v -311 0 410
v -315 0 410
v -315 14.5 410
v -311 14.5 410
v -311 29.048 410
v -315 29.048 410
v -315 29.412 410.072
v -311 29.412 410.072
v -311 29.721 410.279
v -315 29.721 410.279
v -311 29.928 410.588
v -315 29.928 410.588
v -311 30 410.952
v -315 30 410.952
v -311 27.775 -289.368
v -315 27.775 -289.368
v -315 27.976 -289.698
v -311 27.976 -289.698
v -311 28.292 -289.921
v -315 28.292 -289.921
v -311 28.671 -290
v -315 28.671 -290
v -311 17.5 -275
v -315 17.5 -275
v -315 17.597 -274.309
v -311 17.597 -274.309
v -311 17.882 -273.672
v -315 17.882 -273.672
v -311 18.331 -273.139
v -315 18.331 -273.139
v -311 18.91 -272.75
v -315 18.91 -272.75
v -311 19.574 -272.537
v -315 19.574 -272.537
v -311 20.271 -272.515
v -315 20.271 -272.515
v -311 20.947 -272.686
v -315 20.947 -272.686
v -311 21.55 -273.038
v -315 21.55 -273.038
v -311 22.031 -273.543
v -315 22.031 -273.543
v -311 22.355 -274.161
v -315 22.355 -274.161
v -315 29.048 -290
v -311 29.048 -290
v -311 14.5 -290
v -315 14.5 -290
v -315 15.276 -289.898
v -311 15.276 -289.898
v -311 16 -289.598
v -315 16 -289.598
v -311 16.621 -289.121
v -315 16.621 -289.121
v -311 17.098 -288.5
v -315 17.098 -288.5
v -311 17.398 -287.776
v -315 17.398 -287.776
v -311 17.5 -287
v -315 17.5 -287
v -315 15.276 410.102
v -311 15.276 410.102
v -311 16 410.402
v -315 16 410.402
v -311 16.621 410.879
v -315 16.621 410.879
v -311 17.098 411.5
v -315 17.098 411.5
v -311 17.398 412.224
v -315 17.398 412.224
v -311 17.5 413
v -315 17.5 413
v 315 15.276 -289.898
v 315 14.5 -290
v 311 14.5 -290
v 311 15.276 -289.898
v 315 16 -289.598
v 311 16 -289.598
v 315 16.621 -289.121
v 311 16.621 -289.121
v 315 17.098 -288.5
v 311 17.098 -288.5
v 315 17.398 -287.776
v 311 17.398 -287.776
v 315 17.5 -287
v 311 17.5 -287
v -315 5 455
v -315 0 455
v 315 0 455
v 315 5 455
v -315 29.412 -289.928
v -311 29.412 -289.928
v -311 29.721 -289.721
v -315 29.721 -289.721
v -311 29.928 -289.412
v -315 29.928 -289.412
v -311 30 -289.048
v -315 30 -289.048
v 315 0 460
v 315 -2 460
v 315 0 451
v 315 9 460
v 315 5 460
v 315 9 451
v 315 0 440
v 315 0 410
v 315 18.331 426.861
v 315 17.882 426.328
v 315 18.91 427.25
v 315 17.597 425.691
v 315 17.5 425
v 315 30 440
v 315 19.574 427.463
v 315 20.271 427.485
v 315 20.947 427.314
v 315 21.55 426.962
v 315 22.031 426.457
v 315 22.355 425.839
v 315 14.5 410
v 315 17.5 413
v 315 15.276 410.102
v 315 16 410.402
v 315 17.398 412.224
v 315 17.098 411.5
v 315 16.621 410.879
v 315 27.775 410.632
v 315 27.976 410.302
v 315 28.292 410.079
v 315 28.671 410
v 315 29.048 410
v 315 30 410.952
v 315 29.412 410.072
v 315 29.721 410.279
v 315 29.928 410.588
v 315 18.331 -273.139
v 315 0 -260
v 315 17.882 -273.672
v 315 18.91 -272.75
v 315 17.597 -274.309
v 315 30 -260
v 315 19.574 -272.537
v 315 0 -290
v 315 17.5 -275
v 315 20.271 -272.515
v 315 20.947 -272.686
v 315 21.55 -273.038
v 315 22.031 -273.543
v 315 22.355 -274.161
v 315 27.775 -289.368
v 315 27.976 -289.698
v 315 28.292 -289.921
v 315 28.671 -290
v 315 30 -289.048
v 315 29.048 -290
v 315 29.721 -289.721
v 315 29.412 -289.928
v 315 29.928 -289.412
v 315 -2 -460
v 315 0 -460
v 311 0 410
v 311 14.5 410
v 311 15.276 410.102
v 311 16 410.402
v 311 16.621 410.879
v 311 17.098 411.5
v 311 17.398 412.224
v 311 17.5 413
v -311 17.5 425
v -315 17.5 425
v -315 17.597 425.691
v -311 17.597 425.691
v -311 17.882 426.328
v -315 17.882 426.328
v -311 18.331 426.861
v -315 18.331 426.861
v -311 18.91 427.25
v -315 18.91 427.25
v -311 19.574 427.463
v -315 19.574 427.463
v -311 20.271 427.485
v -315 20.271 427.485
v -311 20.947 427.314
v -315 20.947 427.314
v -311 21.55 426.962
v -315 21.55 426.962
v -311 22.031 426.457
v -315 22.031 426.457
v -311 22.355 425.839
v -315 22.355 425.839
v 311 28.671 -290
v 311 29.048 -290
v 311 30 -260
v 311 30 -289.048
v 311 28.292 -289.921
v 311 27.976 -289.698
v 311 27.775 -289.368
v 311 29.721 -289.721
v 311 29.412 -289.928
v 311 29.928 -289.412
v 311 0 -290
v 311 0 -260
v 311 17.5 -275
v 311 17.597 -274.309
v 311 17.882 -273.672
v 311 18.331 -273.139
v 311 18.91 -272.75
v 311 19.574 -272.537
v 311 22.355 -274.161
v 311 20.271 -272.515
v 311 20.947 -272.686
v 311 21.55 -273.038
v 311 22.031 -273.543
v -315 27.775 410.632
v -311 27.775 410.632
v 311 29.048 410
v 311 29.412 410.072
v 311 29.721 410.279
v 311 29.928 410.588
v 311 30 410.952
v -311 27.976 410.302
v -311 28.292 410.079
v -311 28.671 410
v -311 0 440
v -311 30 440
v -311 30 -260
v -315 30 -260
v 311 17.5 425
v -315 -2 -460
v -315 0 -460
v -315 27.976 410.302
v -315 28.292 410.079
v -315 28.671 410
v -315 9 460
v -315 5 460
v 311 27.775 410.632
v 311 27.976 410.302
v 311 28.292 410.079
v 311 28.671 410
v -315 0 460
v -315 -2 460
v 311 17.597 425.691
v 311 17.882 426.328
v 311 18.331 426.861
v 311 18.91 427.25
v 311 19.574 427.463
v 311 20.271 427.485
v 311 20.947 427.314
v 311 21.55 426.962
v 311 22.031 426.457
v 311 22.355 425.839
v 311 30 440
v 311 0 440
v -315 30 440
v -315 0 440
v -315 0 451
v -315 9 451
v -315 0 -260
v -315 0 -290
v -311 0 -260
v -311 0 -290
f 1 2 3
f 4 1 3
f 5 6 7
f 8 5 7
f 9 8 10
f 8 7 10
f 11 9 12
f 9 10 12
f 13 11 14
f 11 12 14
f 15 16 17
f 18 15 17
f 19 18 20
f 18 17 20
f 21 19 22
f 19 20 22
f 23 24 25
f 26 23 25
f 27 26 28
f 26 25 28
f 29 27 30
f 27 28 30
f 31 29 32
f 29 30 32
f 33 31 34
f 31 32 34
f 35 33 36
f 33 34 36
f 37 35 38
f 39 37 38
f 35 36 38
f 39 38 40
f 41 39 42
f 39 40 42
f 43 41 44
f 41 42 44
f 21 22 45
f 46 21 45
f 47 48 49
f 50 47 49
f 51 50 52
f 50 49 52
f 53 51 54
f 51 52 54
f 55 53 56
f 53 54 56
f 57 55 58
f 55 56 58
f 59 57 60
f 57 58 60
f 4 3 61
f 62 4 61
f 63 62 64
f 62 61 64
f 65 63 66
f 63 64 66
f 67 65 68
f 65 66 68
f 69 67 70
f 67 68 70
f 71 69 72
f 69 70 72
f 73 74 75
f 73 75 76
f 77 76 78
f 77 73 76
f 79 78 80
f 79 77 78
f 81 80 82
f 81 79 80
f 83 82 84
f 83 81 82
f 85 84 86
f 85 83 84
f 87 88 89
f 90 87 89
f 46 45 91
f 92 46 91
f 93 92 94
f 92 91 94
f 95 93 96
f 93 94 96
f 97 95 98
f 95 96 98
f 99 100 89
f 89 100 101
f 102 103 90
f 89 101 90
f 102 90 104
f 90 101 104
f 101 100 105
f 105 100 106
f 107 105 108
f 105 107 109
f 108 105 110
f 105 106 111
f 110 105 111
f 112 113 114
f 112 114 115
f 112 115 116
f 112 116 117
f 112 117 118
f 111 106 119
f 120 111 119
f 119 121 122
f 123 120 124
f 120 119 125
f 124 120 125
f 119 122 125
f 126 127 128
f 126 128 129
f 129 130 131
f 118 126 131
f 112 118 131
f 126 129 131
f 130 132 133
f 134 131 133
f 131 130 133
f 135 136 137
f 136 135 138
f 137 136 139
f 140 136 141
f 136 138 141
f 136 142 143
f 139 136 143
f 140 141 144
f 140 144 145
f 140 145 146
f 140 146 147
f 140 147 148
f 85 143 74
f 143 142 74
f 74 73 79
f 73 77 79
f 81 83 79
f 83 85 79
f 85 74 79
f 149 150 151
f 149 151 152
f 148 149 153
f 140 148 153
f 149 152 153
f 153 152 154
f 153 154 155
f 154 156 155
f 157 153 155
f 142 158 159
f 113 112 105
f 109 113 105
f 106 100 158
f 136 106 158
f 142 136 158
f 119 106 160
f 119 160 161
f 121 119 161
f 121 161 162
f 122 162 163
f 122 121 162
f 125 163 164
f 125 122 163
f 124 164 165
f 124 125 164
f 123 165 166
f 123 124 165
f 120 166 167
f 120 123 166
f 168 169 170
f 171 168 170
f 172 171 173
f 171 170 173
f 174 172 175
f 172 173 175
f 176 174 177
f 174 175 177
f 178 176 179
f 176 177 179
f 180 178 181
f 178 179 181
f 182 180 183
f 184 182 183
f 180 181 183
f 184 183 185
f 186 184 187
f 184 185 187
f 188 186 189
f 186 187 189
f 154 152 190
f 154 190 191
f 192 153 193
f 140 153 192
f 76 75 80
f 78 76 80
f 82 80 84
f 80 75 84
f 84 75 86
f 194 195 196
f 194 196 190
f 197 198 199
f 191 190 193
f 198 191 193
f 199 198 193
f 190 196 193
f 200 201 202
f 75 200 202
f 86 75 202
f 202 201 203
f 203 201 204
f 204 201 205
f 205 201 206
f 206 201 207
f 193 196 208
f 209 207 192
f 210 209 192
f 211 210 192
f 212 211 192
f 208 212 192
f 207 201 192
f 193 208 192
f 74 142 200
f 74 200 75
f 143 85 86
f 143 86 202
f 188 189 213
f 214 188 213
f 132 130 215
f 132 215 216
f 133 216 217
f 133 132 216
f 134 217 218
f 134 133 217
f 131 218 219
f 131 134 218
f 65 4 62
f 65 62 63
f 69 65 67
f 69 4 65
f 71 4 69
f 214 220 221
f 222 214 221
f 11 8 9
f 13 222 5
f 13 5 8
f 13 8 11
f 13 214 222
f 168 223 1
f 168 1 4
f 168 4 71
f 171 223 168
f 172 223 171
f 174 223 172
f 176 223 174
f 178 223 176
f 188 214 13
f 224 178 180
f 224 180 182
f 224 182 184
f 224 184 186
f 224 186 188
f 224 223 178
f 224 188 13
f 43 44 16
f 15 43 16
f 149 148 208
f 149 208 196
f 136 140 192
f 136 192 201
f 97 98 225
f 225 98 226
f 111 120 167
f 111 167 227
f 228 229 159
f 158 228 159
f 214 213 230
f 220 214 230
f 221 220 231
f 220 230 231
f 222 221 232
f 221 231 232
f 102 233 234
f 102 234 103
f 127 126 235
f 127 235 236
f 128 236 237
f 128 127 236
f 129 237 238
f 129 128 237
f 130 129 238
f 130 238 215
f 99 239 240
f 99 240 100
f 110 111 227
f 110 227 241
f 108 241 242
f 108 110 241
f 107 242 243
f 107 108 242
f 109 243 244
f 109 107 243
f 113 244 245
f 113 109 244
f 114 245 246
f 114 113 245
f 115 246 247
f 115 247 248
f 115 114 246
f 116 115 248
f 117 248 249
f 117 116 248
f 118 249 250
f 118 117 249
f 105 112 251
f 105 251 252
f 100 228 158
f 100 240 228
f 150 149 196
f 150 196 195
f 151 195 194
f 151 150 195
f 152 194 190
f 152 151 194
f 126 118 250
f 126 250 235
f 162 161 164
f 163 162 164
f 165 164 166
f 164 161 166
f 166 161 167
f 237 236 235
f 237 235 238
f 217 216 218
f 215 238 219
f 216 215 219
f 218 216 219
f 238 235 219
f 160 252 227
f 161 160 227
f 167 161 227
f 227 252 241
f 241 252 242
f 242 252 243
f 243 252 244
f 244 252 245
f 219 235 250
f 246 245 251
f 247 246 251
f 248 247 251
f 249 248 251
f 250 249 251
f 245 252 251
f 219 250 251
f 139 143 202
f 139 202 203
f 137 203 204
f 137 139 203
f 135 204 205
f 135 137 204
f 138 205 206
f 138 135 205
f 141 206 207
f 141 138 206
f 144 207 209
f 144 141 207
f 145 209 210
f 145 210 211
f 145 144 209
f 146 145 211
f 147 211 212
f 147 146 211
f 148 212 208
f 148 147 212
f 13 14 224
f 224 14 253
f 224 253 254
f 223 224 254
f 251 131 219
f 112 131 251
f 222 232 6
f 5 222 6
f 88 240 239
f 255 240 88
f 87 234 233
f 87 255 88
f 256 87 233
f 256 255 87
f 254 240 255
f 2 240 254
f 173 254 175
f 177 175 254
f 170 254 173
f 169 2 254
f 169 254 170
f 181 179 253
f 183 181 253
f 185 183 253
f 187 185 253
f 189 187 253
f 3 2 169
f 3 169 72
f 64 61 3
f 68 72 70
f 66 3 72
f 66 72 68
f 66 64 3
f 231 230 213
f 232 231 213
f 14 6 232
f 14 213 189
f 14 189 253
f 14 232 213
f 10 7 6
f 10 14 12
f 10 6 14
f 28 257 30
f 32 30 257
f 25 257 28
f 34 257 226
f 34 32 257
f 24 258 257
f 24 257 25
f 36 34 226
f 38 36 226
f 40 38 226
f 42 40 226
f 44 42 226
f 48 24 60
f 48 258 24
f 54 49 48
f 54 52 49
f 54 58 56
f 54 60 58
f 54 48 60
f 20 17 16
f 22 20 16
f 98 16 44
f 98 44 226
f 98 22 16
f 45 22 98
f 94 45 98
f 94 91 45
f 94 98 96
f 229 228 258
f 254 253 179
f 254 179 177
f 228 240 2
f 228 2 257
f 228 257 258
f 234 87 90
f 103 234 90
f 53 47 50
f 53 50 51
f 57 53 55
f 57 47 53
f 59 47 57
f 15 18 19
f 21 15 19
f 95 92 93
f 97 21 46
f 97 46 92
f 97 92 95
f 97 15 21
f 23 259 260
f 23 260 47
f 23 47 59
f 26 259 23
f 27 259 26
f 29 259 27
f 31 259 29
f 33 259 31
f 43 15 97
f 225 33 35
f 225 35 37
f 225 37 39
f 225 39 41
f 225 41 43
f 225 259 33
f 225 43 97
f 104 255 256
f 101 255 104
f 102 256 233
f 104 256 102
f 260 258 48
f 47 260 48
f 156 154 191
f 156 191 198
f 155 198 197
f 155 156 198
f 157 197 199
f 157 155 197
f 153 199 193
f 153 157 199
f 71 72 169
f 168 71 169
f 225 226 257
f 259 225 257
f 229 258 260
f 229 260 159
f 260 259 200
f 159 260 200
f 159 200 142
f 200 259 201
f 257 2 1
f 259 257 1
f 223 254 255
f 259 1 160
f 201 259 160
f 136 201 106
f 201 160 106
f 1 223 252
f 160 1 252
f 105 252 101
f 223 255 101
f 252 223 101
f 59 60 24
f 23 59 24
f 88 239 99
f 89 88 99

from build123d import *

# Parameters (mm, degrees)
F0_W     = 630
F0_H     = 911
F0_H_2   = 4
F0_H_3   = 5
F1_DEPTH = 2
F4_DEPTH = 4
F7_DEPTH = 9
F8_W     = 630
F8_H     = 4
F9_DEPTH = 5


with BuildPart() as f1:
    # F0 (on Front) → F1 (new body)
    with BuildSketch(Plane.XZ):
        with Locations((0, -4.5)):
            Rectangle(F0_W, F0_H)
        with Locations((0, 453)):
            Rectangle(F0_W, F0_H_2)
        with Locations((0, 457.5)):
            Rectangle(F0_W, F0_H_3)
    extrude(amount=F1_DEPTH)

    # F6: F4, F5_1 across plane


with BuildPart() as f4:
    # F3 (on offset) → F4 (new body)
    with BuildSketch(Plane.YZ.offset(-315)):
        with BuildLine():
            Line((0, 440), (0, 410))
            Line((0, 410), (14.5, 410))
            ThreePointArc((14.5, 410), (16.6213203436, 410.8786796564), (17.5, 413))
            Line((17.5, 413), (17.5, 425))
            ThreePointArc((17.5, 425), (19.5741329805, 427.4634604283), (22.3549098254, 425.8392852402))
            Line((22.3549098254, 425.8392852402), (27.7746731609, 410.6322336697))
            ThreePointArc((27.7746731609, 410.6322336697), (28.122676008, 410.1739557831), (28.6711867084, 410))
            Line((28.6711867084, 410), (29.0482506613, 410))
            ThreePointArc((29.0482506613, 410), (29.7212390727, 410.2787609273), (30, 410.9517493387))
            Line((30, 410.9517493387), (30, 440))
            Line((30, 440), (0, 440))
        make_face()
    extrude(amount=F4_DEPTH)


with BuildPart() as f5_1:
    # F5: copy of F4
    add(f4.part.moved(Location((0, 0, -700))))


with BuildPart() as f1_1:
    add(f1.part)
    add(f4.part.mirror(Plane.YZ))
    add(f5_1.part.mirror(Plane.YZ))

    # F0 (on Front) → F7 (join)
    with BuildSketch(Plane.XZ):
        with Locations((0, 453)):
            Rectangle(F0_W, F0_H_2)
    extrude(amount=-F7_DEPTH)


    add(f4.part)  # F9 merges F4

    add(f5_1.part)  # F9 merges F5_1
    # F8 (on face) → F9 (join)
    with BuildSketch(Plane.XY.offset(455)):
        with Locations((0, 7)):
            Rectangle(F8_W, F8_H)
    extrude(amount=F9_DEPTH)


solid = f1_1.part
